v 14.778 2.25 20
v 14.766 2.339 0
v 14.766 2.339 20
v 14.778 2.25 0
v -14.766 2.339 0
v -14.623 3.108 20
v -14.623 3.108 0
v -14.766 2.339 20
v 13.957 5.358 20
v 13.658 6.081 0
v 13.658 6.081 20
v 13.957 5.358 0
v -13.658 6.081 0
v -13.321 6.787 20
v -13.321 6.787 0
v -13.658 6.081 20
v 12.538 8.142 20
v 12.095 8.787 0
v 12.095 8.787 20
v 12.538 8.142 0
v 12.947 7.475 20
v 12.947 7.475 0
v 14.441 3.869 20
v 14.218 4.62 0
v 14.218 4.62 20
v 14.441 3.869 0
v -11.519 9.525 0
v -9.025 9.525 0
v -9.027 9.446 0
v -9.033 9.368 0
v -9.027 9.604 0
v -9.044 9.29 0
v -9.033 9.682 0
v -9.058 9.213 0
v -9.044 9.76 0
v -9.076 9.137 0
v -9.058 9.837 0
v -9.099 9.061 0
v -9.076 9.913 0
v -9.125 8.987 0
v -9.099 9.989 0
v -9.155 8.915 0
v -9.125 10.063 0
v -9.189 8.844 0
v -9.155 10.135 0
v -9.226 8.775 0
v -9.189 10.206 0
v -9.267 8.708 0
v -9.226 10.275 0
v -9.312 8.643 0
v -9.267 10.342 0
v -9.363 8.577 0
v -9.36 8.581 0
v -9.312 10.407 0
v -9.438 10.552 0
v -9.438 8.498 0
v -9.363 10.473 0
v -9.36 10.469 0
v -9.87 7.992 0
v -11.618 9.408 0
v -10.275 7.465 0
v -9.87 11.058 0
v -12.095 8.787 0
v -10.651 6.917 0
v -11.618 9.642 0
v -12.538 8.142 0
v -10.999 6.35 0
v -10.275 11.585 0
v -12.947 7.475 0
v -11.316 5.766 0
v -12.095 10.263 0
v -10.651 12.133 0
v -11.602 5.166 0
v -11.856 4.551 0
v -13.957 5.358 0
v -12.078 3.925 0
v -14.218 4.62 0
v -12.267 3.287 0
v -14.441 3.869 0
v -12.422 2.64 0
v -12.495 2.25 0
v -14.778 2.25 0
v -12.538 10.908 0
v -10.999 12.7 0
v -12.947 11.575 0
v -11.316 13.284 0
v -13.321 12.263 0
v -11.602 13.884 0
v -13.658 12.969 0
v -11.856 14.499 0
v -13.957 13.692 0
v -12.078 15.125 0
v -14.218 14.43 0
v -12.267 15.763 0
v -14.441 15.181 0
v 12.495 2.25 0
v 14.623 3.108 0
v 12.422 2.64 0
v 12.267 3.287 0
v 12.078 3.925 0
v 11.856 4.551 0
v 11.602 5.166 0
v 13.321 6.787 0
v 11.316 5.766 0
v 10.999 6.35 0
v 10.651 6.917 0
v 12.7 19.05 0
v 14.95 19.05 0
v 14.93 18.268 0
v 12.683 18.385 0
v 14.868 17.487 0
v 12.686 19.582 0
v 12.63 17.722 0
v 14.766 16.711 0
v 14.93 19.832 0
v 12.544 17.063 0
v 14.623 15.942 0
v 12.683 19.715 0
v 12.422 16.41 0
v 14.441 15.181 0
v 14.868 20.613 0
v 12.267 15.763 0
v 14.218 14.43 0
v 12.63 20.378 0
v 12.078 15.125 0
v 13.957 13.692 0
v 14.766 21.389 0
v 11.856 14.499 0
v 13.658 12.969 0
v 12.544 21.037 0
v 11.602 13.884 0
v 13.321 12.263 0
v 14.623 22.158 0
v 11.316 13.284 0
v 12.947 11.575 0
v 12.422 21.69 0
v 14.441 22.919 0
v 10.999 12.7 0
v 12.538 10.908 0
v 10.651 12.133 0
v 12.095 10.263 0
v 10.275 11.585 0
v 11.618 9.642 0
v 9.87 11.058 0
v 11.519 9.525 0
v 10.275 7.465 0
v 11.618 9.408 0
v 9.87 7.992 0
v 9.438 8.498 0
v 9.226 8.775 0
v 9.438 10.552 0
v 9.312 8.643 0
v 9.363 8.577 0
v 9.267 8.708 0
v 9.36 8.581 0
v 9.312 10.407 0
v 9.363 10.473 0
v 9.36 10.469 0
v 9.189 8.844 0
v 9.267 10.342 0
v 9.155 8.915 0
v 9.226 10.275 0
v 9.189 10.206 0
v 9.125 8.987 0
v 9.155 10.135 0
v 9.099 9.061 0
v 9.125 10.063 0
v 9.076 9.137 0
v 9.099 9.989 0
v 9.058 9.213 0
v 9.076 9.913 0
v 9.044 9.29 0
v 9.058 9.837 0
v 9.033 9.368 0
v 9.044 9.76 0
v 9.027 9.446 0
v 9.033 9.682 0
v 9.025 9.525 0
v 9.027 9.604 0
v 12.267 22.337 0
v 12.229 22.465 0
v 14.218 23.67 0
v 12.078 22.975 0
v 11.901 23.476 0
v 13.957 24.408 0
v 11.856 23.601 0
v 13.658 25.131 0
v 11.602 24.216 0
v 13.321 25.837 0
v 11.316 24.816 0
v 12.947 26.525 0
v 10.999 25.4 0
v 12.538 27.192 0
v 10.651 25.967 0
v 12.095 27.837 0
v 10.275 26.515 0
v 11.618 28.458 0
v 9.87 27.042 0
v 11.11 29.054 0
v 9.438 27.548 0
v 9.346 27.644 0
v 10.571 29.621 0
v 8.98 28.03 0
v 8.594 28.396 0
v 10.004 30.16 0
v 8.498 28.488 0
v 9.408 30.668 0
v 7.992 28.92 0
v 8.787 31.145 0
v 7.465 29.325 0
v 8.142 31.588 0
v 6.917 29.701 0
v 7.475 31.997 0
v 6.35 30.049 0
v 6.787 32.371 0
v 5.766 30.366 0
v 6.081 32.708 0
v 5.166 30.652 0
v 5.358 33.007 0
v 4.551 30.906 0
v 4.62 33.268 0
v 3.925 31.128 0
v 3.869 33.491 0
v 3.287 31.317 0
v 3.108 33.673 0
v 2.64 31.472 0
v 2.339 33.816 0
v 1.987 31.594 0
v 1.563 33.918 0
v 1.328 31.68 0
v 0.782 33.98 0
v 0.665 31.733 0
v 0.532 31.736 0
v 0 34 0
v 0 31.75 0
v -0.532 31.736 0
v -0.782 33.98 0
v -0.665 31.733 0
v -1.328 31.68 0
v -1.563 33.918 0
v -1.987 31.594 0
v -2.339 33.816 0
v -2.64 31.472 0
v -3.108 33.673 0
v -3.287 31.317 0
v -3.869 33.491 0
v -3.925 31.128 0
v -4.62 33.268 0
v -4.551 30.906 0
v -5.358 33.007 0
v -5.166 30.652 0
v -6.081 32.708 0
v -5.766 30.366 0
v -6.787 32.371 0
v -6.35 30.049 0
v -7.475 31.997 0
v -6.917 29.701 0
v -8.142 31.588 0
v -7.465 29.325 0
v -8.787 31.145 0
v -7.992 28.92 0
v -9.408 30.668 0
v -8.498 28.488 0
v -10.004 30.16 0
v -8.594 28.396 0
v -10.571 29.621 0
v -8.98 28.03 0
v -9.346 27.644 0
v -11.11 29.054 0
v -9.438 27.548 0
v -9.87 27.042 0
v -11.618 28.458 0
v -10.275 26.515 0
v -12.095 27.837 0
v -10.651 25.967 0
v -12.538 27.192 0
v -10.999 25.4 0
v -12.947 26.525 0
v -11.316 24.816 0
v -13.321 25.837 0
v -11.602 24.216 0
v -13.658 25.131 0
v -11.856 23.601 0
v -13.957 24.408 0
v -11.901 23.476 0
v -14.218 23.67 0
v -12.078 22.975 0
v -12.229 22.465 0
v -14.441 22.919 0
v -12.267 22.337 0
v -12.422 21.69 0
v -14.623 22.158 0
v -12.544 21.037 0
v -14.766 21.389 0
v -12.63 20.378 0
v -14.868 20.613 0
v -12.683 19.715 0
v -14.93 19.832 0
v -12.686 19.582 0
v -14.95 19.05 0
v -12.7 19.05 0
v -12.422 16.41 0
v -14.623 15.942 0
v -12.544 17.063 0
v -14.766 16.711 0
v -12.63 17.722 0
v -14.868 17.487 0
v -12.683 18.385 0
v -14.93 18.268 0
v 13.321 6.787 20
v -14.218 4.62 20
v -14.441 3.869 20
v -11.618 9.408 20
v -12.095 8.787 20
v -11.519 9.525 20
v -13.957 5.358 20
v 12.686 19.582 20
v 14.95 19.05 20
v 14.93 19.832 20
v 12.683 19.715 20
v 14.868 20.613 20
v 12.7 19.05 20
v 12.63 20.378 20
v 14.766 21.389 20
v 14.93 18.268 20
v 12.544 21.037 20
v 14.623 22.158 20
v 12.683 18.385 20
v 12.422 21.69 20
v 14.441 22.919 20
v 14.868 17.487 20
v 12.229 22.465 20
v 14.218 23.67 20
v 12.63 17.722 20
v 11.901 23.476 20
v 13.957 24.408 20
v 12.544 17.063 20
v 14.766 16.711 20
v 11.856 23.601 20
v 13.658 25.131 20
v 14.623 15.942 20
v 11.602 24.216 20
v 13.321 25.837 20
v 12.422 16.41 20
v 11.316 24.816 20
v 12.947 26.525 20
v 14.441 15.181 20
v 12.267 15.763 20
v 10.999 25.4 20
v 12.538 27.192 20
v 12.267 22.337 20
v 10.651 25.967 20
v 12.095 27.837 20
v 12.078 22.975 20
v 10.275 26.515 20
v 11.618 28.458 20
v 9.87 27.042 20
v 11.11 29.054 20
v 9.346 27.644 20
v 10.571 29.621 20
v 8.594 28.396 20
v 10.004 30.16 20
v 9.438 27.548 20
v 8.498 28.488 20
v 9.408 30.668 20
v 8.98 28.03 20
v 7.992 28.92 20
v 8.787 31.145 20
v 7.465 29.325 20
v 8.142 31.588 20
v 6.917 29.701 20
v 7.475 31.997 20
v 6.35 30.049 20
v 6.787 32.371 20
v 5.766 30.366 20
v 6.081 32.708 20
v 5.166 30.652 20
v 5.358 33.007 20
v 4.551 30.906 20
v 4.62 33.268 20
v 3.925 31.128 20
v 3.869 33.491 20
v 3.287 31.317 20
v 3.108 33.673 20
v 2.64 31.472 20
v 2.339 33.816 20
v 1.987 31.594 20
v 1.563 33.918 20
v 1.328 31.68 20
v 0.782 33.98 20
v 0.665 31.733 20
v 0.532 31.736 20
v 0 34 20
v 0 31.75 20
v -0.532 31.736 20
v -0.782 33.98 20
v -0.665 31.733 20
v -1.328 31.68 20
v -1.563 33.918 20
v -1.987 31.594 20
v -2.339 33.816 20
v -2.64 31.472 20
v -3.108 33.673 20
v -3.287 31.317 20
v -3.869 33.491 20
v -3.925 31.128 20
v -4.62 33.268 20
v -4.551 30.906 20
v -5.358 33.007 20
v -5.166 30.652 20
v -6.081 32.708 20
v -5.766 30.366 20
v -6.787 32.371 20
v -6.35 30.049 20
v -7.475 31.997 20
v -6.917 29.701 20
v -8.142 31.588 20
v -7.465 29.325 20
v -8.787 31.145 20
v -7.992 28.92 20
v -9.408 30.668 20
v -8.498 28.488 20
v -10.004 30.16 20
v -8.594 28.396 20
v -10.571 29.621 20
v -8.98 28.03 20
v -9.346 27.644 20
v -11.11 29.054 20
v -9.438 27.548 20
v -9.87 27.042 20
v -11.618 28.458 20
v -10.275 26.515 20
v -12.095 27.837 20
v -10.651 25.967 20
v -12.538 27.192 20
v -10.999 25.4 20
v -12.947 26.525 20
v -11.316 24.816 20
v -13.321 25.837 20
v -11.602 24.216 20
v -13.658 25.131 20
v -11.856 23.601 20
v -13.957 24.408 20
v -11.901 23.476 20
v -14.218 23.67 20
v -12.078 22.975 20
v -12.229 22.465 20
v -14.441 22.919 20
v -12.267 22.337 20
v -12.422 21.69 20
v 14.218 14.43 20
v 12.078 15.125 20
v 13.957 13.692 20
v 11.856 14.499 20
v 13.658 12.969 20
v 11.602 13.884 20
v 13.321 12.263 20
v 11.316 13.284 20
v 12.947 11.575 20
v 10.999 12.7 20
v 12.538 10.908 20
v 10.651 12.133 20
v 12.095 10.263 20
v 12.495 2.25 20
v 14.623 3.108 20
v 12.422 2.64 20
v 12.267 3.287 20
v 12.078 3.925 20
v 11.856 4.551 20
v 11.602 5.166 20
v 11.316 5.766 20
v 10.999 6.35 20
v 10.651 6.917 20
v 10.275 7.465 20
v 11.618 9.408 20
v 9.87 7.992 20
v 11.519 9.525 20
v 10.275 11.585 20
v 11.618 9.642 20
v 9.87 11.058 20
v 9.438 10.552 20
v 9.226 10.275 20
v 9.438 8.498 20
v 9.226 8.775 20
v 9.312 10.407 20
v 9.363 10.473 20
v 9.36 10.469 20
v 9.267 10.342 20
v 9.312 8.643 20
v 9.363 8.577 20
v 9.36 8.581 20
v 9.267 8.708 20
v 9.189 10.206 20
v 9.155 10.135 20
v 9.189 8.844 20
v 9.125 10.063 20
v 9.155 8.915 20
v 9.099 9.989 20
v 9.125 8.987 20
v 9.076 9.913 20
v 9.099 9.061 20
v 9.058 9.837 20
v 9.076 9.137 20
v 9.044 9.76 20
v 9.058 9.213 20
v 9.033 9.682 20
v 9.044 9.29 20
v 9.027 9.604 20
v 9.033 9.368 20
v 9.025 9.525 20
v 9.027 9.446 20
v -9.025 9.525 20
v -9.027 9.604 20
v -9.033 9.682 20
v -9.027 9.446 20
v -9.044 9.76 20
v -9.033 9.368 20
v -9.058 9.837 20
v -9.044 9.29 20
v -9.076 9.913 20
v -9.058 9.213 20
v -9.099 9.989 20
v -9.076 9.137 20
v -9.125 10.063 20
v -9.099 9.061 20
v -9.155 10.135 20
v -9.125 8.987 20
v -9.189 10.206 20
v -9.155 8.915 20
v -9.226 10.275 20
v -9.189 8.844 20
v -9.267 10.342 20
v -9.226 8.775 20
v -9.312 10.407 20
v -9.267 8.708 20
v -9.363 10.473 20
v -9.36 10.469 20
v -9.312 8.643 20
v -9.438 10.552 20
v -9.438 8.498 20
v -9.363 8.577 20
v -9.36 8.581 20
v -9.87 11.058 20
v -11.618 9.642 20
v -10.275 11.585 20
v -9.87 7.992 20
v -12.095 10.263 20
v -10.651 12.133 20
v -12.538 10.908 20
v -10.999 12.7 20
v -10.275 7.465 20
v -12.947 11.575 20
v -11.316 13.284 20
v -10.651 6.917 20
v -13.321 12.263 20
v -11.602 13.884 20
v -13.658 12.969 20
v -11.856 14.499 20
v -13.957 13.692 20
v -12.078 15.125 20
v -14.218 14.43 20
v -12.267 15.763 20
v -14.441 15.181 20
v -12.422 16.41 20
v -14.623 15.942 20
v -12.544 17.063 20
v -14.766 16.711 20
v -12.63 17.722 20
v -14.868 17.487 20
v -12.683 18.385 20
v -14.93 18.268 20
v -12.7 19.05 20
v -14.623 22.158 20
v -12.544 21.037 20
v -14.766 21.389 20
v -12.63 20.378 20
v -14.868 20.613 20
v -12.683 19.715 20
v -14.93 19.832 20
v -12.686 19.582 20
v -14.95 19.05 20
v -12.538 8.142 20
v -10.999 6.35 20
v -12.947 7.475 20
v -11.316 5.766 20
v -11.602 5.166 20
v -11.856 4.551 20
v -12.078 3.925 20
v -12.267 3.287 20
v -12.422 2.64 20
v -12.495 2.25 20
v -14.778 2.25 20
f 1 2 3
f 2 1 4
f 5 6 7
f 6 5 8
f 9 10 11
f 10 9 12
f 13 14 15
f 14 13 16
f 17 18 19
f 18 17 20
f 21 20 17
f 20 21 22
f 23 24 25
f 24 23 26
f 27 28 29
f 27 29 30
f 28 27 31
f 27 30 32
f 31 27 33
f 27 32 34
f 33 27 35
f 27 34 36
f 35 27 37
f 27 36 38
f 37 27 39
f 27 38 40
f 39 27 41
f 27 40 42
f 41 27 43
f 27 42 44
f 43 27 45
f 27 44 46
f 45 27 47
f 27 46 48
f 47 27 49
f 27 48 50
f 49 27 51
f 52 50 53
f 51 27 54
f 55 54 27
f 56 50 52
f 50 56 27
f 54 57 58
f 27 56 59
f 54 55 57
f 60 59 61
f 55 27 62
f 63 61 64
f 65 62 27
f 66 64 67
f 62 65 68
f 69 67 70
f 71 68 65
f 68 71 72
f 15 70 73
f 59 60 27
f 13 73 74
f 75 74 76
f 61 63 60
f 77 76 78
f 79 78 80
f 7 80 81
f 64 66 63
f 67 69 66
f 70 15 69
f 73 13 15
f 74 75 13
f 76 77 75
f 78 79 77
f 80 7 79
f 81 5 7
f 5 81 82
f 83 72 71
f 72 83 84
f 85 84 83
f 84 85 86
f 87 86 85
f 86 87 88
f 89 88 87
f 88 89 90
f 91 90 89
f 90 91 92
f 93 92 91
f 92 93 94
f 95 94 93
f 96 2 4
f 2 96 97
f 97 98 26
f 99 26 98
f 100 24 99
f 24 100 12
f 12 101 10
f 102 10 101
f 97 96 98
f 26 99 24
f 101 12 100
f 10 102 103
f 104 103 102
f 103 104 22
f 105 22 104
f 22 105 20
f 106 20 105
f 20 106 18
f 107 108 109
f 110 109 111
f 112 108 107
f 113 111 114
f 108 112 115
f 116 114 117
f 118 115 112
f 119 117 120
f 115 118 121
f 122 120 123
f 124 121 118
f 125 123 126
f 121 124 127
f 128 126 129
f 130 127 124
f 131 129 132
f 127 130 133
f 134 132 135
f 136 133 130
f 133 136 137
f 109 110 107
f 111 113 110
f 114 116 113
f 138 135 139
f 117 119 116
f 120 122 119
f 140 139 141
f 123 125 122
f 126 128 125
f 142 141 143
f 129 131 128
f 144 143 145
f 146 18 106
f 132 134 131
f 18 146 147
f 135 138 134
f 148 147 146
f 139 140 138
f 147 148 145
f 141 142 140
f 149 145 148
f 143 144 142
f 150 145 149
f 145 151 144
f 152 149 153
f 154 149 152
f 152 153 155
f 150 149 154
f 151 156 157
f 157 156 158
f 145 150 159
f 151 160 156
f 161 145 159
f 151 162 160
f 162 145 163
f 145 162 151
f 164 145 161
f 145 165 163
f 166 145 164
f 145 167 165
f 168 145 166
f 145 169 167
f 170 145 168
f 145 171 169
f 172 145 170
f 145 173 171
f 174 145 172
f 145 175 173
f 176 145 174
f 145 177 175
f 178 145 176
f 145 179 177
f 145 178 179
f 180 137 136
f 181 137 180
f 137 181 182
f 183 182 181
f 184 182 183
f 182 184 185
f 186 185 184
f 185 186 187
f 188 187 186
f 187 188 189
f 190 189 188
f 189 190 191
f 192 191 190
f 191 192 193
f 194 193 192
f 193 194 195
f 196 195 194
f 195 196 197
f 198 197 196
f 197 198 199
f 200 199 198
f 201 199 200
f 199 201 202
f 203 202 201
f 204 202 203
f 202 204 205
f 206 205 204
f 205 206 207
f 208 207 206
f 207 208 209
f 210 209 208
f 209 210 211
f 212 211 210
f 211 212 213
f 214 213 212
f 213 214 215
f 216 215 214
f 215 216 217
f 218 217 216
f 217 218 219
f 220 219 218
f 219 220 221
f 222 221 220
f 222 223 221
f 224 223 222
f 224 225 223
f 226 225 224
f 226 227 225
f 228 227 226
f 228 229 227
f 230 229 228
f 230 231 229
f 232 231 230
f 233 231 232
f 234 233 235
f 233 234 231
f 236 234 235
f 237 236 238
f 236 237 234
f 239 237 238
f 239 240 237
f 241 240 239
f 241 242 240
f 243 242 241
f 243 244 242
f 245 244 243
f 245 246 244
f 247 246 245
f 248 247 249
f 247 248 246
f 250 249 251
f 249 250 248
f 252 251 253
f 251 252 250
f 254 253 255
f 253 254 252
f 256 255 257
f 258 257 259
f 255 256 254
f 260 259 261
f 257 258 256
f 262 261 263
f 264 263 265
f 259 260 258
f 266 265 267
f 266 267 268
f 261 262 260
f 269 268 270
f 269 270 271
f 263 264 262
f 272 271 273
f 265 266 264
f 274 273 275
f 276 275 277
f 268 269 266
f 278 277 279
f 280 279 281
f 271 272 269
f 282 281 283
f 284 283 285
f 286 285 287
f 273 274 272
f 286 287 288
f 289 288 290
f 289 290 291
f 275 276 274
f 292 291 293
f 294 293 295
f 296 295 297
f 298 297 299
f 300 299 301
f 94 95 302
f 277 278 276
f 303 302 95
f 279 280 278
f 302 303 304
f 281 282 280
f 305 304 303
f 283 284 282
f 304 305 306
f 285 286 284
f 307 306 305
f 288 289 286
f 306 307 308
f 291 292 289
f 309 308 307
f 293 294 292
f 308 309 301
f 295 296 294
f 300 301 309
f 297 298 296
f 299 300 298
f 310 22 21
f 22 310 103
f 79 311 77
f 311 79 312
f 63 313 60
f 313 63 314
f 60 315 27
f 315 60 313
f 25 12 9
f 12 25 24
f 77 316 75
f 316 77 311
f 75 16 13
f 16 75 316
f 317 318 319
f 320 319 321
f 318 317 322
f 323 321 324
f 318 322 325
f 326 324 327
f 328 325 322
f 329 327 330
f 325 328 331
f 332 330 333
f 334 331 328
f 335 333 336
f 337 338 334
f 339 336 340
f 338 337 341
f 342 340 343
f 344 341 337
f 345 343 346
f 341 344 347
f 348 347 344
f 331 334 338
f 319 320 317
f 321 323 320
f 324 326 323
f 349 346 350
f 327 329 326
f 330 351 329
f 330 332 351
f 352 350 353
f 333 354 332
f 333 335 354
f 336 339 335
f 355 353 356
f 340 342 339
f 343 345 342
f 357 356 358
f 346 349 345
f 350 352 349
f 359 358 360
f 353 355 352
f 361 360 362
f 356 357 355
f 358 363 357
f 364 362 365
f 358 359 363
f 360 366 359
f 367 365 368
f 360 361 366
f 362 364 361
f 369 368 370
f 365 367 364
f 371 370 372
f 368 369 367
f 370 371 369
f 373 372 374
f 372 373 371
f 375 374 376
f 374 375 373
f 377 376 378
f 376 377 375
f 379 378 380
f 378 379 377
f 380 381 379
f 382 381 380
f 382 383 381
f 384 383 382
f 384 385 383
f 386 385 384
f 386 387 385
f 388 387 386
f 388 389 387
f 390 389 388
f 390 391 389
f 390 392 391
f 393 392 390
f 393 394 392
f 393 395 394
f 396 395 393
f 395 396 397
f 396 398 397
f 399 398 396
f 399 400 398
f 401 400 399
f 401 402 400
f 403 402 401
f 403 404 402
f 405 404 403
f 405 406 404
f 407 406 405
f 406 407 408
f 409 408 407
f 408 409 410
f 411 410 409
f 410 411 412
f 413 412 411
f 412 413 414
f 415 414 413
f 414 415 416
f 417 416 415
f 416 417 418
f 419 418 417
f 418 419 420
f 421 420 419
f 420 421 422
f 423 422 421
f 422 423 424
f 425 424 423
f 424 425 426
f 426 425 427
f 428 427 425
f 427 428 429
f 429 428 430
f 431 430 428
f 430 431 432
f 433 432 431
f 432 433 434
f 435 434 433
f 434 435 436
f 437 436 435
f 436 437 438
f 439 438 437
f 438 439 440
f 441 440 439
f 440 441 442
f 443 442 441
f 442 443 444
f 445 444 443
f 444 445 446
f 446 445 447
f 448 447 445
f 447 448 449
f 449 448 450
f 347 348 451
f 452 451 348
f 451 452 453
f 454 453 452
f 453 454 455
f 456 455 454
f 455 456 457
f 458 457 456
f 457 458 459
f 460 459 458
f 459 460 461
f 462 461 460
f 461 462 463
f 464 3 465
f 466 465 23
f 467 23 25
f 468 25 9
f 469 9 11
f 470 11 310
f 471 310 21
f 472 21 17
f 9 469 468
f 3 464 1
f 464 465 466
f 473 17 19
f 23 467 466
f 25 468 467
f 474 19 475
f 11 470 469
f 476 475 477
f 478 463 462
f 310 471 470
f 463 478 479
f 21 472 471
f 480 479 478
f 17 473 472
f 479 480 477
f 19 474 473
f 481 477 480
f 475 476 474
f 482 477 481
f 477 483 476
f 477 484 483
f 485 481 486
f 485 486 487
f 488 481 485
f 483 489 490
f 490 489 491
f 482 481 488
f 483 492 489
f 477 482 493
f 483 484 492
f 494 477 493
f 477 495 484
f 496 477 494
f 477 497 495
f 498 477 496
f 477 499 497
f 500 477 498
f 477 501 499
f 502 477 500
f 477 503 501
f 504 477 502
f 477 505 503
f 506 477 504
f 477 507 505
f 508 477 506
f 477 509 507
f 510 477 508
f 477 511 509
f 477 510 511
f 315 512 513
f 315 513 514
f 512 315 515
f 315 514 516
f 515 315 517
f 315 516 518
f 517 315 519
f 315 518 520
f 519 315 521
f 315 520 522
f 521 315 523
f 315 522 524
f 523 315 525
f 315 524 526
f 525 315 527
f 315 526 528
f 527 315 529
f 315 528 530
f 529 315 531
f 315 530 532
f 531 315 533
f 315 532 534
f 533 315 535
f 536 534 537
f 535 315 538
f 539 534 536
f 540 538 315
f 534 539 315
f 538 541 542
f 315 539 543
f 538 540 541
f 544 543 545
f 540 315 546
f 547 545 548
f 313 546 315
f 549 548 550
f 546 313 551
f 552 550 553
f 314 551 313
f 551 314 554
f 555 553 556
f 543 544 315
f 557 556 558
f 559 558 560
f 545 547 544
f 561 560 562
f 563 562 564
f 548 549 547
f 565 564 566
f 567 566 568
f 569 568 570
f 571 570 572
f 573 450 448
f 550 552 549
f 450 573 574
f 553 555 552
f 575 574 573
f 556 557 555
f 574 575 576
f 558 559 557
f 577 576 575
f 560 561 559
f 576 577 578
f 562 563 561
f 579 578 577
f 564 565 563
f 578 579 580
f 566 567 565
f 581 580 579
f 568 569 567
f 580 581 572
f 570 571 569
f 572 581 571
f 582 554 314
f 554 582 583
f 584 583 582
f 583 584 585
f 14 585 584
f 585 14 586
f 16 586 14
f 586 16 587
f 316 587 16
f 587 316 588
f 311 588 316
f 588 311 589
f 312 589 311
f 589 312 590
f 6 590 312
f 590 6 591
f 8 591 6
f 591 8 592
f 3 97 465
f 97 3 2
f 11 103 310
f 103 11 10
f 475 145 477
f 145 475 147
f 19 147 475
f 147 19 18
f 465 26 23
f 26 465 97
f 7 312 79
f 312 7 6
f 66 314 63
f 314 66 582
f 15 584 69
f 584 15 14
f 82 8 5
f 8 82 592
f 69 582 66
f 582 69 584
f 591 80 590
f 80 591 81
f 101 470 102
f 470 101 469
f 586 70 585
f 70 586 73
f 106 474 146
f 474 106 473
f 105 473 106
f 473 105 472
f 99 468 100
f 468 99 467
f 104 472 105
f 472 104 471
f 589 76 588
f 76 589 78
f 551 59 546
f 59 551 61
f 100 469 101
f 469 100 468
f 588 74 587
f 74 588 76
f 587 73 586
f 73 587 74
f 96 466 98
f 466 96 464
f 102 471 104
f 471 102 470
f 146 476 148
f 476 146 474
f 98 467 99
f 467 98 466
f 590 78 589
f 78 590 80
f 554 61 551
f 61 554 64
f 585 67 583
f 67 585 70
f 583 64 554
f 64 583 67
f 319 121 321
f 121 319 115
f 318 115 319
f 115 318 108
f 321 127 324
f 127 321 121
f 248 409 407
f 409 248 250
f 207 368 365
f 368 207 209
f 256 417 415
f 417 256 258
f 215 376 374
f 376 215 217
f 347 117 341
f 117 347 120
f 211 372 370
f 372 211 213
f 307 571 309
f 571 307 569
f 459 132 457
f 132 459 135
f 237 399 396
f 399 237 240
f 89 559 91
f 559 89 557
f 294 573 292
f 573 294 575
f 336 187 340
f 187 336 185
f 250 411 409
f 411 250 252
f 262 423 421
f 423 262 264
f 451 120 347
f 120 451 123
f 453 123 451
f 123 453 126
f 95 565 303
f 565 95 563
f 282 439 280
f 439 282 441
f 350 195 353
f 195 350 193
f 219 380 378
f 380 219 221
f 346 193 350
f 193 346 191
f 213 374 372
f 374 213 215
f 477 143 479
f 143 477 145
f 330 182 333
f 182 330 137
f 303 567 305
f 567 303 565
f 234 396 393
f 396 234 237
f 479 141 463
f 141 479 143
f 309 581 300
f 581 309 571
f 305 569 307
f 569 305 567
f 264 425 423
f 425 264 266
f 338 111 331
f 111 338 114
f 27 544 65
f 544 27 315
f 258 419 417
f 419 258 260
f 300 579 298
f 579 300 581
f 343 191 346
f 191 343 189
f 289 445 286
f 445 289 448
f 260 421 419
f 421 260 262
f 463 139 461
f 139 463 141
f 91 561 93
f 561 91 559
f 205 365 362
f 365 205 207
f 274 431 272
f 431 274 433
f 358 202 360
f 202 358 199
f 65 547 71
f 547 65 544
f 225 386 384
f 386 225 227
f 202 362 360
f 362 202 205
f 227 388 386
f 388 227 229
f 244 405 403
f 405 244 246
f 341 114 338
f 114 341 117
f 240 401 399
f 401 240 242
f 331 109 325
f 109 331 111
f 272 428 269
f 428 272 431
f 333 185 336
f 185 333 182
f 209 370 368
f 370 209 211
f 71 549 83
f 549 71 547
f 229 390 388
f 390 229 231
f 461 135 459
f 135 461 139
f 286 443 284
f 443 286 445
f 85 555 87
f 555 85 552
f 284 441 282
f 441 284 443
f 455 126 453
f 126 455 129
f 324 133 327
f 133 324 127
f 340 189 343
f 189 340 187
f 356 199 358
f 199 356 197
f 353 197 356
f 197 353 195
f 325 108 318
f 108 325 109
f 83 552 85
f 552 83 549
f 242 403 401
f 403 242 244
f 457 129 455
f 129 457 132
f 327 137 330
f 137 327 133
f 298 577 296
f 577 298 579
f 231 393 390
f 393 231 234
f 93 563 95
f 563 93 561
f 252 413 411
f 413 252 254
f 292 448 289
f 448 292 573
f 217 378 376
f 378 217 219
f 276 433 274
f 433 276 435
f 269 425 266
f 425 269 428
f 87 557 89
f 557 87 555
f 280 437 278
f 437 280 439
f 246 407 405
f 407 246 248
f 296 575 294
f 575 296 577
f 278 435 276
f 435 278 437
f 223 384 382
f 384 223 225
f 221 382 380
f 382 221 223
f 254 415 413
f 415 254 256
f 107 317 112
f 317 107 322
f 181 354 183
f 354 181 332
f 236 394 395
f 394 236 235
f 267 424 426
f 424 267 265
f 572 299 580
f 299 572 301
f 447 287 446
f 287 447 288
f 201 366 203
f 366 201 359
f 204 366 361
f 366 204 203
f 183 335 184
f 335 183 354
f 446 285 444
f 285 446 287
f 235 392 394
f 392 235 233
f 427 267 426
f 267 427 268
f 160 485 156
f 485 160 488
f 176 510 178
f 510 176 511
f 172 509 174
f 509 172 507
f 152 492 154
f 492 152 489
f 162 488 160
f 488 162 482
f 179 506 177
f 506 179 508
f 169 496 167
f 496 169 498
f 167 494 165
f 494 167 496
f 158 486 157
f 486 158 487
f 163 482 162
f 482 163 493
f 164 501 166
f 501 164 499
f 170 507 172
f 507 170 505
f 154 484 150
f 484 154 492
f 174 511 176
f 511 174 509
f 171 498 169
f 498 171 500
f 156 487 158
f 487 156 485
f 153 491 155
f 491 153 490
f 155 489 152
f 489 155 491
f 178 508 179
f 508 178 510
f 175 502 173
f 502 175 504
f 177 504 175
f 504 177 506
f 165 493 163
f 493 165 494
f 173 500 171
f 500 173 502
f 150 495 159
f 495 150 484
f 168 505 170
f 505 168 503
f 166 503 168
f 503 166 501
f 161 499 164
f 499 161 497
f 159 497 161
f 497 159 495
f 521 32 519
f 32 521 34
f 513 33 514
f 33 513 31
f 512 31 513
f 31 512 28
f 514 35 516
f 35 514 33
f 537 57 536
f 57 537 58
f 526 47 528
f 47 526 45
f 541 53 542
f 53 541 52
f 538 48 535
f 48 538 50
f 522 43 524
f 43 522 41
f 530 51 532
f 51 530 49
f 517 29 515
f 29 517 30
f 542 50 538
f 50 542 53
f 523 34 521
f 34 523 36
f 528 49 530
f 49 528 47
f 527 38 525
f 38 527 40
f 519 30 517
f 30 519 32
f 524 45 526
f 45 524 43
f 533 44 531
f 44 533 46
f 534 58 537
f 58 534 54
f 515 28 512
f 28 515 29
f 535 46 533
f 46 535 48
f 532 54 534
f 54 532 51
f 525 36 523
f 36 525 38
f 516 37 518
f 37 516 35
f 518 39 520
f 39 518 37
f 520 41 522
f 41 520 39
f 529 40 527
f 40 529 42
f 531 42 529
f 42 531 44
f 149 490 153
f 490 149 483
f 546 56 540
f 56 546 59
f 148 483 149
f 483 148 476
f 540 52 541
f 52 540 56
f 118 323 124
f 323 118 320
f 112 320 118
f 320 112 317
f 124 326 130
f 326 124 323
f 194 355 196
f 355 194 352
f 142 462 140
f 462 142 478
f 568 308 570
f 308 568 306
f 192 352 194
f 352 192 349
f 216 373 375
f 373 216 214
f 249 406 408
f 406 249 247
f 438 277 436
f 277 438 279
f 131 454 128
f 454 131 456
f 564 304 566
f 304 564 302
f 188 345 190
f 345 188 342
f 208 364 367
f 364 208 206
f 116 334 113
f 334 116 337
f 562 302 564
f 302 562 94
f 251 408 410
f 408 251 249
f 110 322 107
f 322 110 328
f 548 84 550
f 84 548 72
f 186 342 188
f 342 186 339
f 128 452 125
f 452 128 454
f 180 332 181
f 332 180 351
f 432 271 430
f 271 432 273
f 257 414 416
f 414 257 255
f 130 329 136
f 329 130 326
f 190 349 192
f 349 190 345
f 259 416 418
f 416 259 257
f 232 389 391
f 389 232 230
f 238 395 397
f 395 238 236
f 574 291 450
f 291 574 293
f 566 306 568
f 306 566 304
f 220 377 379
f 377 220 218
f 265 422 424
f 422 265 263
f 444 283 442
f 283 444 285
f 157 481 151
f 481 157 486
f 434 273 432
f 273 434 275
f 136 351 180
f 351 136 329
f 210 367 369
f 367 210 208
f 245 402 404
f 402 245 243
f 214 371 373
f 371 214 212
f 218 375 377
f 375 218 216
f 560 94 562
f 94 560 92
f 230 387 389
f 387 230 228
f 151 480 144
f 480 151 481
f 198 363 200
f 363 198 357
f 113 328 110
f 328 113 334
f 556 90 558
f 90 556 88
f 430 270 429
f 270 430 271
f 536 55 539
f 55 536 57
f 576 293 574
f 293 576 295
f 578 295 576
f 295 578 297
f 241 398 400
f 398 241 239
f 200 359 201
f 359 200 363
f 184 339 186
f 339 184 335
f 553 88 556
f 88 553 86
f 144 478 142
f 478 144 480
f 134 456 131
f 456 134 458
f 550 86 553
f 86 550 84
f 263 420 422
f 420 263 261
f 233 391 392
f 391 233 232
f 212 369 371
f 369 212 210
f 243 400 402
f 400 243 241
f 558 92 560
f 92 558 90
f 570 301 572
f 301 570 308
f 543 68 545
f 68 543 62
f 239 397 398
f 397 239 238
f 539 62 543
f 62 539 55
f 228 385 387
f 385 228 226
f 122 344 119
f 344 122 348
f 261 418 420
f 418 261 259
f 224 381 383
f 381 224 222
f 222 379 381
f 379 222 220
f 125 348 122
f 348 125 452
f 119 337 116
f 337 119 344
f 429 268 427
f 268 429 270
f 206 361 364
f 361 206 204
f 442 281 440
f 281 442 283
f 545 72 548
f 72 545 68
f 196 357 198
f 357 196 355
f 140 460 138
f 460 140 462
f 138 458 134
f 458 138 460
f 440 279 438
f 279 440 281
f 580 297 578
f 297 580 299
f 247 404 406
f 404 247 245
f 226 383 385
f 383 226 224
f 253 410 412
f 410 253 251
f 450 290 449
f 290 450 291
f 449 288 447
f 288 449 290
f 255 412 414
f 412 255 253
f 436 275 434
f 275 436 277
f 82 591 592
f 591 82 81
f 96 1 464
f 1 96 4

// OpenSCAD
// License:  Creative Commons Attribtion-NonCommercial-ShareAlike
// http://creativecommons.org/licenses/by-nc-sa/3.0/legalcode
//
// Author: Jetty, 7th July, 2012
//
// Modified by Thomas Kircher, May 25, 2017
//
// U Clip, to clip sheeting to PVC piping

quantity = 1;

insideDiameter = 25.4;
thickness = 2.25;
length = 20;
flangeDistanceMult = 0.75;
flangeTerminateMult = 0.5;
manifoldCorrection = 0.04;
extra_chamfer = 0;

$fn = 120;

cubeSize = insideDiameter + thickness * 2;
distanceBetween = insideDiameter + thickness * 2 + 3;

 // Generate clips
 if(quantity > 0) {
     // Find the size of the smallest square that fits the quantity
     grid_size = ceil(sqrt(quantity));
     
     // Fill the square in row order
     for(n = [0 : quantity - 1]) {
         translate( [floor(n % grid_size) * distanceBetween,
                     floor(n / grid_size) * distanceBetween, 0] )
         pvcClip();
     }
 }
 
// Creates a Pvc Clip
module pvcClip()
{
	difference()
	{
		union()
		{
            // Clip ends
			hollowCylinder( insideDiameter / 2 + thickness, length, thickness );
		
            // Clip body
			translate( [0, flangeDistanceMult * insideDiameter, 0] )
				hollowCylinder( insideDiameter / 2 + thickness, length, thickness );
		}

        // Cutouts for clip body interior
		translate( [0, 0, -manifoldCorrection] )
			cylinder( r = insideDiameter / 2, h = length + manifoldCorrection * 2 );

		translate( [0, flangeDistanceMult * insideDiameter, -manifoldCorrection] )
			cylinder( r = insideDiameter / 2, h = length + manifoldCorrection * 2 );

        // Cutout for clip ends
		translate( [-cubeSize / 2, -cubeSize / 2 - insideDiameter * flangeTerminateMult, -manifoldCorrection] )
			cube( [cubeSize, cubeSize, length + manifoldCorrection * 2] );
        
        // Smoothing stabby bits
        chamfer_stabby_bits();
	}
}

// Chamfer the inner edge of a cylinder
module torus_chamfer()
{
    difference() {
        rotate_extrude($fn = 80)
            translate([insideDiameter / 2 - 1, 0, 0])
                square([2, 2]);
    
        rotate_extrude($fn = 80)
            translate([insideDiameter / 2 + 1, 2, 0])
                circle(r = 1, $fn = 60);
        }
}

// Put a slight chamfer on the sharp inside bits, to keep garden fabric from ripping
module chamfer_stabby_bits()
{
    // Chamfer the inner top and bottom parts of the cylinders.
    if(extra_chamfer == 1) {
        // Bottom of clip handle
        translate( [0, 0, -1] )
            torus_chamfer();

        // Top of clip handle
        translate( [0, 0, length + 1] )
            rotate( [0, 180, 0] )
                torus_chamfer();

        // Bottom of clip body
        translate( [0, flangeDistanceMult * insideDiameter, -1] )
            torus_chamfer();

        // Top of clip body
        translate( [0, flangeDistanceMult * insideDiameter, length + 1] )
            rotate([0, 180, 0])
                torus_chamfer();
    }
    
    chamfer_diameter = 2.5;
    cube_side = chamfer_diameter * 2 + manifoldCorrection;

    y_offset = flangeDistanceMult * insideDiameter / 2;
    x_offset = insideDiameter / 2 * sqrt(1 - flangeDistanceMult * flangeDistanceMult);
    
    difference() {
        union() {
            translate([x_offset + chamfer_diameter * 0.85, y_offset, -manifoldCorrection])
                hollowCylinder(chamfer_diameter, length + manifoldCorrection * 2, 1.0);
    
            translate([-x_offset - chamfer_diameter * 0.85, y_offset, -manifoldCorrection])
                hollowCylinder(chamfer_diameter, length + manifoldCorrection * 2, 1.0);
        }
        
        union() {
            translate([x_offset + 1.0, y_offset - cube_side / 2, -manifoldCorrection * 2])
                cube( [cube_side, cube_side, length + manifoldCorrection * 4]);
            
            translate([-x_offset - cube_side - 1.0, y_offset - cube_side / 2, -manifoldCorrection * 2])
                cube([cube_side, cube_side, length + manifoldCorrection * 4]);
        }
    }
}

// Creates a hollow cylinder
module hollowCylinder(radius, height, thickness)
{
	difference()
	{
		cylinder( r = radius, h = height );
		translate( [0, 0, -manifoldCorrection] )
			cylinder( r = radius - thickness, h = height + manifoldCorrection * 2 );
	}
}
